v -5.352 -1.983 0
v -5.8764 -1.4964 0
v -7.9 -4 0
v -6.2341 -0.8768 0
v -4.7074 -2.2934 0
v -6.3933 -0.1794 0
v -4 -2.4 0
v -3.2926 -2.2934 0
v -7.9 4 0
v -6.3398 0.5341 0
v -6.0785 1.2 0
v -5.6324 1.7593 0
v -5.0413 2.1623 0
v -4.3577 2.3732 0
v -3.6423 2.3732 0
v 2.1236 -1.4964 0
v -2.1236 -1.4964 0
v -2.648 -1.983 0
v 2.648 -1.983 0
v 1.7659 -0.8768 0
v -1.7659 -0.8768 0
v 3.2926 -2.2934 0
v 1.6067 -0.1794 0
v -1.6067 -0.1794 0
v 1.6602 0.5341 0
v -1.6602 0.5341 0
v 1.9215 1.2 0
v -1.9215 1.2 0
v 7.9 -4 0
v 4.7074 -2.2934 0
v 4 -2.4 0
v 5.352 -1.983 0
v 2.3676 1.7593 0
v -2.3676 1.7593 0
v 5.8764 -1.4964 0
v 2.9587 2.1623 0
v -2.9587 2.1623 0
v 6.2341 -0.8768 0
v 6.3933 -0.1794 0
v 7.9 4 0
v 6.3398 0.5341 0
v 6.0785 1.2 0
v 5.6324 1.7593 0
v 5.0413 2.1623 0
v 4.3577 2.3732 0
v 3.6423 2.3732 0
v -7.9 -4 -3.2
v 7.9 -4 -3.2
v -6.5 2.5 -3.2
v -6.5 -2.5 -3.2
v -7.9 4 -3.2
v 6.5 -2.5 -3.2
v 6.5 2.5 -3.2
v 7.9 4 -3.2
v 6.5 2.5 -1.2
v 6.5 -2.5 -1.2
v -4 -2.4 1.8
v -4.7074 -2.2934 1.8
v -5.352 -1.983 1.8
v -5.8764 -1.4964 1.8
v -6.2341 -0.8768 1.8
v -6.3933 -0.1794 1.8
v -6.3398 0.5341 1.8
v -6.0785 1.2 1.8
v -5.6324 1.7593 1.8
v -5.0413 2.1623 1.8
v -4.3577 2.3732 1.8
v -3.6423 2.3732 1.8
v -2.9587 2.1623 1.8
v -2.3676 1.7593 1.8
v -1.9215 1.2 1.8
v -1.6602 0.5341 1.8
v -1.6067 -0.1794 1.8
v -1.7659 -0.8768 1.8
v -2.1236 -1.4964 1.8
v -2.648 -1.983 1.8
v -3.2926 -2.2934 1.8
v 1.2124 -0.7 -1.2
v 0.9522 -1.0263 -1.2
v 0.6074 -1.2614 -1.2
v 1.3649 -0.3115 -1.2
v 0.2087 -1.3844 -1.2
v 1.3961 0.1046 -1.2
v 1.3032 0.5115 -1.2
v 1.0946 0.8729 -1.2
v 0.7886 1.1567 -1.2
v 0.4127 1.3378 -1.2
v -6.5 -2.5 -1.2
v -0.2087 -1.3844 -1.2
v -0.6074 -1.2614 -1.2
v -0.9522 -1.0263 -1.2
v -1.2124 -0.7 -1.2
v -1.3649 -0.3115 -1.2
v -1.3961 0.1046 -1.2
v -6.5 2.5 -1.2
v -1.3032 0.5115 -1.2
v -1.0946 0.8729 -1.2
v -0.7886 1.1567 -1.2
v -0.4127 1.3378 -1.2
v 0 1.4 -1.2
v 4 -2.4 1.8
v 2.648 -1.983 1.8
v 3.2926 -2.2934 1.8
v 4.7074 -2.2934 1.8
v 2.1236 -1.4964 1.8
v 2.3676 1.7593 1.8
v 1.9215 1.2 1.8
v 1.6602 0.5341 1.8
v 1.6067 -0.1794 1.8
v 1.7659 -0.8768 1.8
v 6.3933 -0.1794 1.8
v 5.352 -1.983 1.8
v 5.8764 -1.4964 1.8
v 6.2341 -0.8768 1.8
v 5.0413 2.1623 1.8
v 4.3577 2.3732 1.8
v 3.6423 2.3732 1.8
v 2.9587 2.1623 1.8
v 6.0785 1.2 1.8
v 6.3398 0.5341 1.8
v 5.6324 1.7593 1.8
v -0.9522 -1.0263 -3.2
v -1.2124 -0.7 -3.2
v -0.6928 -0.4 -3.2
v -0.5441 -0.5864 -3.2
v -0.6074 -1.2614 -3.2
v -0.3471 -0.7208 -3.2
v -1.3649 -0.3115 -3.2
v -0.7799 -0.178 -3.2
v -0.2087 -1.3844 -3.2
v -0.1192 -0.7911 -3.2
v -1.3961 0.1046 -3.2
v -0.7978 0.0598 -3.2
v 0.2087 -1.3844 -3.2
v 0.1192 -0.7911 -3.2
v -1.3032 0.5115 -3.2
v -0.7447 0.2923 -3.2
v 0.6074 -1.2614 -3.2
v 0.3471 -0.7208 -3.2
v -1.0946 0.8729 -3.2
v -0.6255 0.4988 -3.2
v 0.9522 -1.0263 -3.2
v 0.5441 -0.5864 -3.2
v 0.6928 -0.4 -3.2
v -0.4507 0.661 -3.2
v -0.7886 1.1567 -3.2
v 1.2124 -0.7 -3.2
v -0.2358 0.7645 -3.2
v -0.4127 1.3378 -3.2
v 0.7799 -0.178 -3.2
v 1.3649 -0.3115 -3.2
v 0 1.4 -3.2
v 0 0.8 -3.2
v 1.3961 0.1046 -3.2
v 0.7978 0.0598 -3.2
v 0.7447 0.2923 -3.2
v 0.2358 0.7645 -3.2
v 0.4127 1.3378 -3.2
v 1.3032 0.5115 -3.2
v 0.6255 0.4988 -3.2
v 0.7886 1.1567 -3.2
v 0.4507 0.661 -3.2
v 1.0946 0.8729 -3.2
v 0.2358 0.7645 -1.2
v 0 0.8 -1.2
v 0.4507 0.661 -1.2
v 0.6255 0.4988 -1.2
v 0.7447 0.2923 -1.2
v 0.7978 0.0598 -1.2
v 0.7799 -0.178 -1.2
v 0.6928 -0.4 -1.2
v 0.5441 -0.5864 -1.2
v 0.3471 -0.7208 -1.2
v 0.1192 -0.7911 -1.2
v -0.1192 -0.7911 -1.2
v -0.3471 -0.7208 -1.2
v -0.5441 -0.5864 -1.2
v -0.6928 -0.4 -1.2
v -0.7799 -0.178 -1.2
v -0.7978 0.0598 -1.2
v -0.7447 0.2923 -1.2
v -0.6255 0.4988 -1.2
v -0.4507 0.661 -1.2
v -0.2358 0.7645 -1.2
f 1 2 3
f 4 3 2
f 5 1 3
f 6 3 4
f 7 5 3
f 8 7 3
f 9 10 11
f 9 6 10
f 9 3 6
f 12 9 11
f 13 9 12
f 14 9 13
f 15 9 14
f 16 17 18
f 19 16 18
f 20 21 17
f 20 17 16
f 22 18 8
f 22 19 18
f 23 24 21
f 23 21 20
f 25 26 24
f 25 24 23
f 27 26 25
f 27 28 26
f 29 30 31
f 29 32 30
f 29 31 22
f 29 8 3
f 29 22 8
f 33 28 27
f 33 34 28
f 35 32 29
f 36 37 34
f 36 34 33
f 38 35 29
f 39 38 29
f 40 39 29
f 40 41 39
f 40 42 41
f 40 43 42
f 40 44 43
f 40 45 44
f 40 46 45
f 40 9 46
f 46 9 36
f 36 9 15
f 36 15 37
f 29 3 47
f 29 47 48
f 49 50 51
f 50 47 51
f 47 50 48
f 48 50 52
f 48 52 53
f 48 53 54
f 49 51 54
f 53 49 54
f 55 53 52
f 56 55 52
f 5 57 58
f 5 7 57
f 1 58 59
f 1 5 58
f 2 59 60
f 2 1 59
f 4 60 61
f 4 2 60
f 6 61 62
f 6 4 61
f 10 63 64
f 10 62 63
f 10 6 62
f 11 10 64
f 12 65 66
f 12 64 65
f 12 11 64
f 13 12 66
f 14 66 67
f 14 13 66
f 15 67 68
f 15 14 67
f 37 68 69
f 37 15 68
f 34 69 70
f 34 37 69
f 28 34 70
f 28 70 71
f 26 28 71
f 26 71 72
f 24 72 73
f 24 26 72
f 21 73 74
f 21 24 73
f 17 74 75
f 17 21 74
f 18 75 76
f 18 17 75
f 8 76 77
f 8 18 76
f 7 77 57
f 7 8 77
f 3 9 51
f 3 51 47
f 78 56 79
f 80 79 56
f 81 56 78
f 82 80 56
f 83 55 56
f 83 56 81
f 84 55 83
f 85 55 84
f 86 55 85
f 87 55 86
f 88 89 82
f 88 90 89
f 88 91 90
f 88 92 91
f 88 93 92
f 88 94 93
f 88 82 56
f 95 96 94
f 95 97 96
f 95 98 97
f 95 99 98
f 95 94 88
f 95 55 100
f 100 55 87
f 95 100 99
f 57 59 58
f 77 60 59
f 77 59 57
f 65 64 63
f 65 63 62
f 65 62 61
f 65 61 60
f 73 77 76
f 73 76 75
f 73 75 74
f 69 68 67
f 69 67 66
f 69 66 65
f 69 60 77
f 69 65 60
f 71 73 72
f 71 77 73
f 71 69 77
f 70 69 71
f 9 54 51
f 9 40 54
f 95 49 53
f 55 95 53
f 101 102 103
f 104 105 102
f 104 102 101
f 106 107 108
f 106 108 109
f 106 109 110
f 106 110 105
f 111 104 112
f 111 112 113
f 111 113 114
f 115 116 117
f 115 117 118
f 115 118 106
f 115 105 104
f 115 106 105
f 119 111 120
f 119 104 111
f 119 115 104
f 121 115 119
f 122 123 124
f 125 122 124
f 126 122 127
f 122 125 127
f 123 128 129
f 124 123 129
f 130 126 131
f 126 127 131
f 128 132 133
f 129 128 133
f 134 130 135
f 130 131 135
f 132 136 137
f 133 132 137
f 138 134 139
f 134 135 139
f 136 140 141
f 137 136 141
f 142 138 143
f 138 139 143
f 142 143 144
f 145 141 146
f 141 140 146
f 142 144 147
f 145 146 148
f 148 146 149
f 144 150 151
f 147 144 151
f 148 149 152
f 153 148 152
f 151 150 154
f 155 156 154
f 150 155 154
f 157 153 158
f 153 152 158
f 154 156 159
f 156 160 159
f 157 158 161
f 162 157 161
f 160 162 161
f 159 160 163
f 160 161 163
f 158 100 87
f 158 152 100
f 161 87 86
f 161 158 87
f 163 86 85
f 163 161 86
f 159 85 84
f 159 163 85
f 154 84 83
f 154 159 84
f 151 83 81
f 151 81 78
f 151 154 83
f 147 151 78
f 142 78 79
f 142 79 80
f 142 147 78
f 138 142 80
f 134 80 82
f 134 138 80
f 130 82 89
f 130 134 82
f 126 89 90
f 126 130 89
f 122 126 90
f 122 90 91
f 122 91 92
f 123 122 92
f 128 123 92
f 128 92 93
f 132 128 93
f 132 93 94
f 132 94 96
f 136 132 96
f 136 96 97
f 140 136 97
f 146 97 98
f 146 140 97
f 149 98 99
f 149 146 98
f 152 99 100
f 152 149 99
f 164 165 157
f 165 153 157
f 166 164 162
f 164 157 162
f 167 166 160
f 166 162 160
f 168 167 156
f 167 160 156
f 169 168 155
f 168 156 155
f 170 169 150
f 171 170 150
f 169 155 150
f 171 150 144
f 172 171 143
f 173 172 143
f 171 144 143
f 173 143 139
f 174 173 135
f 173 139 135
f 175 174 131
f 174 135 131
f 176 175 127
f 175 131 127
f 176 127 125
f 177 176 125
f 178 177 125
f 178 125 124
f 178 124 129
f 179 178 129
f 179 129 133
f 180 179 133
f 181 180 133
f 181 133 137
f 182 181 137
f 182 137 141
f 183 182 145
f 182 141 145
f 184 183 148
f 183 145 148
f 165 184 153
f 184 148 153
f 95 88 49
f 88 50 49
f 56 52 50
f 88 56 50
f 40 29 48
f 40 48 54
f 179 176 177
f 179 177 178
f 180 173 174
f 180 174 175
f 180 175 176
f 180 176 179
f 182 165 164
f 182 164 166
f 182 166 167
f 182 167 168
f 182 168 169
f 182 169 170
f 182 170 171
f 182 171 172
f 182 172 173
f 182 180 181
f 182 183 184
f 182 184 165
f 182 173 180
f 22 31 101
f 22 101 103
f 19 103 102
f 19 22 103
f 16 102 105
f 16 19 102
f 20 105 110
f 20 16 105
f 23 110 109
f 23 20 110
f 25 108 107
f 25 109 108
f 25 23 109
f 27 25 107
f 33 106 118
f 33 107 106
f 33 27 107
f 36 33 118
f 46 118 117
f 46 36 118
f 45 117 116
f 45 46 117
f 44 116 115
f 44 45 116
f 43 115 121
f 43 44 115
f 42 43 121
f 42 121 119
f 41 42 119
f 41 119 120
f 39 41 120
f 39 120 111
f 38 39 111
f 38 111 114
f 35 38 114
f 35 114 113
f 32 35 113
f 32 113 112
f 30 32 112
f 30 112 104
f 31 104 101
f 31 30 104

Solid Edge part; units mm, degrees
sketch "Sketch1" plane through (0, 0, 0) normal (0, 0, 1) x (1, 0, 0)
  line L0 (7.9, 4) -> (-7.9, 4)
  line L1 (-7.9, 4) -> (-7.9, -4)
  line L2 (-7.9, -4) -> (7.9, -4)
  line L3 (7.9, -4) -> (7.9, 4)
  dimension "D1" = 15.8
  dimension "D2" = 8
extrude "Protrusion1" add sketch "Sketch1" against normal blind 3.2
sketch "Sketch2" plane through (0, 0, -3.2) normal (0, 0, -1) x (0, 1, 0)
  line L0 (2.5, -6.5) -> (2.5, 6.5)
  line L1 (2.5, 6.5) -> (-2.5, 6.5)
  line L2 (-2.5, 6.5) -> (-2.5, -6.5)
  line L3 (-2.5, -6.5) -> (2.5, -6.5)
  circle A0 centre (0, 0) radius 1.4
  circle A1 centre (0, 0) radius 0.8
  dimension "D1" = 13
  dimension "D2" = 5
  dimension "D3" = 2.8
  dimension "D4" = 1.6
extrude "ExtrudedCutout_1" cut sketch "Sketch2" against normal blind 2
sketch "Sketch3" plane through (0, 0, 0) normal (0, 0, 1) x (0, -1, 0)
  circle A0 centre (0, 4) radius 2.4
  circle A1 centre (0, -4) radius 2.4
  dimension "D1" = 4.8
  dimension "D2" = 4.8
extrude "ExtrudedProtrusion_2" add sketch "Sketch3" along normal blind 1.8
